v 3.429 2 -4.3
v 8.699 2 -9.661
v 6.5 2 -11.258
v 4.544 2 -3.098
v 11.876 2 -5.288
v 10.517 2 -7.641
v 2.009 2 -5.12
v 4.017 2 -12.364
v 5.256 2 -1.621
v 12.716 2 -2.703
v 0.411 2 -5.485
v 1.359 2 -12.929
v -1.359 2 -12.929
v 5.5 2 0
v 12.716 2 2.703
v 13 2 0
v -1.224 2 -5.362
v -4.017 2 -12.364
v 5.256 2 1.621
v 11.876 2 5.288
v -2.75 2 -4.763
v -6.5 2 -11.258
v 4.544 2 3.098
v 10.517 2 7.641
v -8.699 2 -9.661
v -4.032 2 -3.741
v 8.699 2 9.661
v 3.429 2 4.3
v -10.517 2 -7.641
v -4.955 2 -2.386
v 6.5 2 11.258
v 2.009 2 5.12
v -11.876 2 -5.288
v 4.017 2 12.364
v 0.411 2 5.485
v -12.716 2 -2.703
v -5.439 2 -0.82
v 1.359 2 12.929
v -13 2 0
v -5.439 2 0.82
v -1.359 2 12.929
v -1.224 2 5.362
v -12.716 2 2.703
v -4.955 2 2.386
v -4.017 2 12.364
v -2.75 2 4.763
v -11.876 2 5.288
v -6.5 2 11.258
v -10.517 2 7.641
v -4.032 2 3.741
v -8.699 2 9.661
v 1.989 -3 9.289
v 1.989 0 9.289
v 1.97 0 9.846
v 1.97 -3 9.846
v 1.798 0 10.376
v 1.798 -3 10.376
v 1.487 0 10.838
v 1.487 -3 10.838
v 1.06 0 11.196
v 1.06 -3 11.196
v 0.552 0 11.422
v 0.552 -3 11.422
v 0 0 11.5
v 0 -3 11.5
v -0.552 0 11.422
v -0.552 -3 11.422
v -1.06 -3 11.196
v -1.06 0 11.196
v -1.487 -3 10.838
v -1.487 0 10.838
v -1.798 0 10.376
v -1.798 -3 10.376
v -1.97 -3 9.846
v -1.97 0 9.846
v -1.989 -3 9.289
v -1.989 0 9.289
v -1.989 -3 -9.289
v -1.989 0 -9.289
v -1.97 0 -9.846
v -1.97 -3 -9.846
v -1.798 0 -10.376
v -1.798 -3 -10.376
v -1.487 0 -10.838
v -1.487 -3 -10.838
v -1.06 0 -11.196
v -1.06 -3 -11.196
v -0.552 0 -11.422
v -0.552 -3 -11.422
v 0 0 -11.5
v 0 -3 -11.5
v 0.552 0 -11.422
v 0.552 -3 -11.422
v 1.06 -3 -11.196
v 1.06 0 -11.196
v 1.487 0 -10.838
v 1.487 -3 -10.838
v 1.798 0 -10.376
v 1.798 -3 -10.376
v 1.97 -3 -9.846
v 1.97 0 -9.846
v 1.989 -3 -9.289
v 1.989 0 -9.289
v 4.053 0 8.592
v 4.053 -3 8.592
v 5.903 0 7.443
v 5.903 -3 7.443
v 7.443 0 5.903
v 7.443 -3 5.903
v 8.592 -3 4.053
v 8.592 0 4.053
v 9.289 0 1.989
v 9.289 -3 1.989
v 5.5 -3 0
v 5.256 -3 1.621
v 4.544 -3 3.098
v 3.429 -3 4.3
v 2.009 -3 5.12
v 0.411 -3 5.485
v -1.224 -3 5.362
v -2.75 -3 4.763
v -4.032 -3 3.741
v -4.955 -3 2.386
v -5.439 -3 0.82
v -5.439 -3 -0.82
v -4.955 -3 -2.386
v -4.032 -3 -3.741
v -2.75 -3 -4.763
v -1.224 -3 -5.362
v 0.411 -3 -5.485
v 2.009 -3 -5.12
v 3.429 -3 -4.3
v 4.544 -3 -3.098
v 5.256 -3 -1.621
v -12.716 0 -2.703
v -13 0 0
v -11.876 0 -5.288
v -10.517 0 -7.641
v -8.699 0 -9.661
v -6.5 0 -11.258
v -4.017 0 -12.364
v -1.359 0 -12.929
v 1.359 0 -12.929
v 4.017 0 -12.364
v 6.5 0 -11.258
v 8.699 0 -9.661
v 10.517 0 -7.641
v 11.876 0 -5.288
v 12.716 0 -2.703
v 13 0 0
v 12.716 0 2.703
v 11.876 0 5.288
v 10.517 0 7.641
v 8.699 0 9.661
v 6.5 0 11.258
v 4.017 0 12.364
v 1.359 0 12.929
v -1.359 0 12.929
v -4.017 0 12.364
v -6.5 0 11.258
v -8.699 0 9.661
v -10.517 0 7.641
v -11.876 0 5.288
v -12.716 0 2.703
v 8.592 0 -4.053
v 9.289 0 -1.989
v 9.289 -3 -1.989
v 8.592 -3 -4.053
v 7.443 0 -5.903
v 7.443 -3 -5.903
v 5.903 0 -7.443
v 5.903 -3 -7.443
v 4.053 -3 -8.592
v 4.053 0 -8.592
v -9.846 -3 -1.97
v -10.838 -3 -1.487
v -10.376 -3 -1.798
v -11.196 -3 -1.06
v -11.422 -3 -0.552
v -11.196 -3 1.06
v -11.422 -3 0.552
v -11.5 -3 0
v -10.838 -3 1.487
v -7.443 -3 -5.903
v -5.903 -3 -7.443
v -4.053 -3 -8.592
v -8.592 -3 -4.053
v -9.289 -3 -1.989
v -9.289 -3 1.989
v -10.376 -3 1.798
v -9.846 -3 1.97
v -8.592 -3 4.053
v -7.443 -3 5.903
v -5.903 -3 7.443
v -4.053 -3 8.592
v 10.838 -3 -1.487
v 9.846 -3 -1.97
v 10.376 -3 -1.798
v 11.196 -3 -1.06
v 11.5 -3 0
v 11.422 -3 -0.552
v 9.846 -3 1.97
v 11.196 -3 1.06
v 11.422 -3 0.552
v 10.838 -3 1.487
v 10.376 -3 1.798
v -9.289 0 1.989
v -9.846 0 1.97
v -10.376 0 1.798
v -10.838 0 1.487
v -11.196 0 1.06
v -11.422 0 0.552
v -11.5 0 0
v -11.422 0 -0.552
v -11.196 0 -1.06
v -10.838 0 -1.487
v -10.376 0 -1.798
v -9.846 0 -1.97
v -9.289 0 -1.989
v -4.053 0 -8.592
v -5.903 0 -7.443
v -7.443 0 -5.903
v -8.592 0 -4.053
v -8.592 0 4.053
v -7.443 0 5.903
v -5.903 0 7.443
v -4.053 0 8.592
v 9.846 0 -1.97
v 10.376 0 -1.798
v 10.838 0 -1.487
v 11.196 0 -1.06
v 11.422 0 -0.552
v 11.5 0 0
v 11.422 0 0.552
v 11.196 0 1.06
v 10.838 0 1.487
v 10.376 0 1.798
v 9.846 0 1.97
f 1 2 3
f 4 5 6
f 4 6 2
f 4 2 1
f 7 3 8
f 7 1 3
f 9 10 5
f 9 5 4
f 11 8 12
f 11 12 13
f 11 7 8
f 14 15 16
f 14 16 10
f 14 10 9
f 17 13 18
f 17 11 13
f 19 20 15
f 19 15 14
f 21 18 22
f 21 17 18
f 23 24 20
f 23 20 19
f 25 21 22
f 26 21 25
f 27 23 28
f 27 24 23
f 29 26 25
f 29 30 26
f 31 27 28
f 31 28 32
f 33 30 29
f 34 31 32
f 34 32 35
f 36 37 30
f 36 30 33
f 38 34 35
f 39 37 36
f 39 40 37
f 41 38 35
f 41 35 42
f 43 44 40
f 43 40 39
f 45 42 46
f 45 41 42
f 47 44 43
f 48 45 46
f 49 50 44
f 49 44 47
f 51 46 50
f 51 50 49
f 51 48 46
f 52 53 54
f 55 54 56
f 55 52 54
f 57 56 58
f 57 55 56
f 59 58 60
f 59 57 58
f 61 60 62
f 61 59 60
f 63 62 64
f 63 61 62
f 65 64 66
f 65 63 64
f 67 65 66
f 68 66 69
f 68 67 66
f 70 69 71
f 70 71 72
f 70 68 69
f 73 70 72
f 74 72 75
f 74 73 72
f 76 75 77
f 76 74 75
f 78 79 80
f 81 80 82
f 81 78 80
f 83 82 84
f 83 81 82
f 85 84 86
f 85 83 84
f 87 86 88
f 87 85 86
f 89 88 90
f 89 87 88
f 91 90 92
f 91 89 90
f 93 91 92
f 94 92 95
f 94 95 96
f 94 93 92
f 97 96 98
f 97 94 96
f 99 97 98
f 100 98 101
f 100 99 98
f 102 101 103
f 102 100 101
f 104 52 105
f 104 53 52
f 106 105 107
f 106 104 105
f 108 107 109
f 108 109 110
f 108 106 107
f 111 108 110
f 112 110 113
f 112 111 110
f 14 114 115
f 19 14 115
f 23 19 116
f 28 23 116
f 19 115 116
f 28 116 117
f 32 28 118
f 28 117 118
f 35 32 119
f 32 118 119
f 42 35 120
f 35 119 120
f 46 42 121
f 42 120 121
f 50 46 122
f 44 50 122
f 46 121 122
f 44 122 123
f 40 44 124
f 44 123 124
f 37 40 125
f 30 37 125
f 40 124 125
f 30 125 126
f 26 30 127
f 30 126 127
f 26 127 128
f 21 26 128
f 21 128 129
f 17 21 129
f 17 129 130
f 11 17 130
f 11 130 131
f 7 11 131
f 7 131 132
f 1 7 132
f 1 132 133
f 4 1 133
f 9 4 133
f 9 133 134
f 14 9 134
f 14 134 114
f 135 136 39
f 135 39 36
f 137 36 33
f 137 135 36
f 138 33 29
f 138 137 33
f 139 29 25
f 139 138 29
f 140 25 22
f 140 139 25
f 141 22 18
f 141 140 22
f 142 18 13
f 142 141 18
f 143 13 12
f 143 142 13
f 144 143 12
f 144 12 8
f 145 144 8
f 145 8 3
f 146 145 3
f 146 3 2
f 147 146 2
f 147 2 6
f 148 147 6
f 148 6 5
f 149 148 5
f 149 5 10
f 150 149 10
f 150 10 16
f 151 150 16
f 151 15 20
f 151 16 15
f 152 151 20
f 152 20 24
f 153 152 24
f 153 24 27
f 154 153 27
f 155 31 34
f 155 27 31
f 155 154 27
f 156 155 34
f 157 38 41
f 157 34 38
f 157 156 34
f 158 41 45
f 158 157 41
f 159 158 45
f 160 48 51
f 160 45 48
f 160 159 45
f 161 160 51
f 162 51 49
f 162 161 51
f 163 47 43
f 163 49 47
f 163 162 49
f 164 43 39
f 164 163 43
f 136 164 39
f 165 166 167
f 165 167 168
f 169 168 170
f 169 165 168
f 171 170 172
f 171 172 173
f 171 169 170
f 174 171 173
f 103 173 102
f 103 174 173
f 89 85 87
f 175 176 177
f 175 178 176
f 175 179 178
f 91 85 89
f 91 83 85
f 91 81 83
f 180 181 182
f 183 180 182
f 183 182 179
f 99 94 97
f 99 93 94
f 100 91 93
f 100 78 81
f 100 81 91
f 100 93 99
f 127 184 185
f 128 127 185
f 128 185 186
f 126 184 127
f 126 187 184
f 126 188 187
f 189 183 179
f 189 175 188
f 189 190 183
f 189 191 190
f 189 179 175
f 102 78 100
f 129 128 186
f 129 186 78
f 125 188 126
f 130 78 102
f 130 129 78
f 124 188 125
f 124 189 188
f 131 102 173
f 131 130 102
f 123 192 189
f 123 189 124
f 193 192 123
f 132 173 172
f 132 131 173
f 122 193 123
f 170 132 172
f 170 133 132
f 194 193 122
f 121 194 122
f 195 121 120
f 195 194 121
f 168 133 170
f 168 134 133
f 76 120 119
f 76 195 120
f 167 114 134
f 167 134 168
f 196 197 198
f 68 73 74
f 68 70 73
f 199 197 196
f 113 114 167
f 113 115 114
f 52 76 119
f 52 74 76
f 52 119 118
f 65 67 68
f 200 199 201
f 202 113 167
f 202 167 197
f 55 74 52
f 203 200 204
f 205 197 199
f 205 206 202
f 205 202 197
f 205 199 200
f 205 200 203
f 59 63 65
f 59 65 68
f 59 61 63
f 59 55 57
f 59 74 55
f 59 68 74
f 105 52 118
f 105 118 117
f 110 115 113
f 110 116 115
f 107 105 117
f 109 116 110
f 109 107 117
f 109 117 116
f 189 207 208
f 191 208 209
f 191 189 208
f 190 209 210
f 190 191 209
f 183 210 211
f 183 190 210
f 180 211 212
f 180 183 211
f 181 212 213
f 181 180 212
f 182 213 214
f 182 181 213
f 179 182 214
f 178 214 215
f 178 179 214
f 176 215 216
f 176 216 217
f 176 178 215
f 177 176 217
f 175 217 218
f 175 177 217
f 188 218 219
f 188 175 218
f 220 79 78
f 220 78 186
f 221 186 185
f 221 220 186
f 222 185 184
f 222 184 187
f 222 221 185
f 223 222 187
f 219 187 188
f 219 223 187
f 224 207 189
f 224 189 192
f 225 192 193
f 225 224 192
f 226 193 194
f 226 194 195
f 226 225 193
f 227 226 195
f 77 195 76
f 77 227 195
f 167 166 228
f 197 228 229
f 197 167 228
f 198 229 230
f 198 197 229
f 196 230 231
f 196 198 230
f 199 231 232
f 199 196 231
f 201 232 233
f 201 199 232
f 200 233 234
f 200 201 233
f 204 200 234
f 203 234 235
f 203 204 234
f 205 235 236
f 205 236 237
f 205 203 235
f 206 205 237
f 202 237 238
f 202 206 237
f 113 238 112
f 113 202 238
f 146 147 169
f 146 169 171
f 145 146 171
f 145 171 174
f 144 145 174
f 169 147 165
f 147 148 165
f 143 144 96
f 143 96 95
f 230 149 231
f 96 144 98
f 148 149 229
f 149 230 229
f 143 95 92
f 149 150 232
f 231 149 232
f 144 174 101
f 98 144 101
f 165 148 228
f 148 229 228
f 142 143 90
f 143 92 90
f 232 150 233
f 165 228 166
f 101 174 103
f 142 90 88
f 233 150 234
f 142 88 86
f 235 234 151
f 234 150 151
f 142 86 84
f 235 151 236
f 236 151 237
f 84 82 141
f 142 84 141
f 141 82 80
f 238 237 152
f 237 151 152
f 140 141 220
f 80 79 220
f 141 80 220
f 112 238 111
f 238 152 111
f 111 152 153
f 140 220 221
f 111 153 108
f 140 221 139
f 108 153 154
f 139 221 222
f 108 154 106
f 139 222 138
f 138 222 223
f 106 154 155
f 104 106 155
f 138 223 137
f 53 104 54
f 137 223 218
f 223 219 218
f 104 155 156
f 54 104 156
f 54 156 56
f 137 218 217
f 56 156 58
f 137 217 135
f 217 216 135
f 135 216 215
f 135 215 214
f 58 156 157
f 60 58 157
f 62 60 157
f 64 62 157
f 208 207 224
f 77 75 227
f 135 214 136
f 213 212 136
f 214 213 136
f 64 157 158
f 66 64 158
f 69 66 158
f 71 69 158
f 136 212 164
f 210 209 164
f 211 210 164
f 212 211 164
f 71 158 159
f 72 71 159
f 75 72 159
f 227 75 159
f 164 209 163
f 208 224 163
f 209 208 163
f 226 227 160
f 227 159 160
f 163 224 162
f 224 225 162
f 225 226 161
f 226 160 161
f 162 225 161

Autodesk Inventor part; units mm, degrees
ref_plane "YZ Plane" through (0, 0, 0) normal (1, 0, 0) x (0, 1, 0)
ref_plane "XZ Plane" through (0, 0, 0) normal (0, 1, 0) x (-1, 0, 0)
ref_plane "XY Plane" through (0, 0, 0) normal (0, 0, 1) x (1, 0, 0)
sketch "Sketch8" plane through (0, 0, 0) normal (0, 1, 0) x (-1, 0, 0)
  circle A0 centre (0, 0) radius 13
  dimension "d25" = 26
extrude "Extrusion8" add sketch "Sketch8" along normal blind 2
sketch "Sketch9" plane through (0, 0, 0) normal (0, -1, 0) x (1, 0, 0)
  circle A0 centre (0, 0) radius 9.5
  dimension "d28" = 19
extrude "Extrusion9" add sketch "Sketch9" along normal blind 3
sketch "Sketch10" plane through (0, -3, 0) normal (0, -1, 0) x (1, 0, 0)
  circle A0 centre (0, 0) radius 9.5 projected
  circle A1 centre (-9.5, 0) radius 2
  line L0 (-18.2, 0) -> (18.2, 0) projected
  point P0 (-9.2895, -1.9889)
  point P1 (-9.2895, 1.9889)
  dimension "d31" = 4
extrude "Extrusion10" add sketch "Sketch10" against normal up to surface (3 mm away) contours A0 L0 A1 | A1 L0 A0 picked at (-10.0838, 0.5297) picked at (-10.0838, -0.5297)
pattern_circular "Circular Pattern2" count 4 over 360 about axis through (0, 0, 0) along (0, -1, 0) of "Extrusion10"
sketch "Sketch11" plane through (0, -3, 0) normal (0, -1, 0) x (1, 0, 0)
  circle A0 centre (0, 0) radius 5.5
  dimension "d41" = 11
extrude "Extrusion11" cut sketch "Sketch11" against normal up to surface (5 mm away)
properties part number "Tapa"
